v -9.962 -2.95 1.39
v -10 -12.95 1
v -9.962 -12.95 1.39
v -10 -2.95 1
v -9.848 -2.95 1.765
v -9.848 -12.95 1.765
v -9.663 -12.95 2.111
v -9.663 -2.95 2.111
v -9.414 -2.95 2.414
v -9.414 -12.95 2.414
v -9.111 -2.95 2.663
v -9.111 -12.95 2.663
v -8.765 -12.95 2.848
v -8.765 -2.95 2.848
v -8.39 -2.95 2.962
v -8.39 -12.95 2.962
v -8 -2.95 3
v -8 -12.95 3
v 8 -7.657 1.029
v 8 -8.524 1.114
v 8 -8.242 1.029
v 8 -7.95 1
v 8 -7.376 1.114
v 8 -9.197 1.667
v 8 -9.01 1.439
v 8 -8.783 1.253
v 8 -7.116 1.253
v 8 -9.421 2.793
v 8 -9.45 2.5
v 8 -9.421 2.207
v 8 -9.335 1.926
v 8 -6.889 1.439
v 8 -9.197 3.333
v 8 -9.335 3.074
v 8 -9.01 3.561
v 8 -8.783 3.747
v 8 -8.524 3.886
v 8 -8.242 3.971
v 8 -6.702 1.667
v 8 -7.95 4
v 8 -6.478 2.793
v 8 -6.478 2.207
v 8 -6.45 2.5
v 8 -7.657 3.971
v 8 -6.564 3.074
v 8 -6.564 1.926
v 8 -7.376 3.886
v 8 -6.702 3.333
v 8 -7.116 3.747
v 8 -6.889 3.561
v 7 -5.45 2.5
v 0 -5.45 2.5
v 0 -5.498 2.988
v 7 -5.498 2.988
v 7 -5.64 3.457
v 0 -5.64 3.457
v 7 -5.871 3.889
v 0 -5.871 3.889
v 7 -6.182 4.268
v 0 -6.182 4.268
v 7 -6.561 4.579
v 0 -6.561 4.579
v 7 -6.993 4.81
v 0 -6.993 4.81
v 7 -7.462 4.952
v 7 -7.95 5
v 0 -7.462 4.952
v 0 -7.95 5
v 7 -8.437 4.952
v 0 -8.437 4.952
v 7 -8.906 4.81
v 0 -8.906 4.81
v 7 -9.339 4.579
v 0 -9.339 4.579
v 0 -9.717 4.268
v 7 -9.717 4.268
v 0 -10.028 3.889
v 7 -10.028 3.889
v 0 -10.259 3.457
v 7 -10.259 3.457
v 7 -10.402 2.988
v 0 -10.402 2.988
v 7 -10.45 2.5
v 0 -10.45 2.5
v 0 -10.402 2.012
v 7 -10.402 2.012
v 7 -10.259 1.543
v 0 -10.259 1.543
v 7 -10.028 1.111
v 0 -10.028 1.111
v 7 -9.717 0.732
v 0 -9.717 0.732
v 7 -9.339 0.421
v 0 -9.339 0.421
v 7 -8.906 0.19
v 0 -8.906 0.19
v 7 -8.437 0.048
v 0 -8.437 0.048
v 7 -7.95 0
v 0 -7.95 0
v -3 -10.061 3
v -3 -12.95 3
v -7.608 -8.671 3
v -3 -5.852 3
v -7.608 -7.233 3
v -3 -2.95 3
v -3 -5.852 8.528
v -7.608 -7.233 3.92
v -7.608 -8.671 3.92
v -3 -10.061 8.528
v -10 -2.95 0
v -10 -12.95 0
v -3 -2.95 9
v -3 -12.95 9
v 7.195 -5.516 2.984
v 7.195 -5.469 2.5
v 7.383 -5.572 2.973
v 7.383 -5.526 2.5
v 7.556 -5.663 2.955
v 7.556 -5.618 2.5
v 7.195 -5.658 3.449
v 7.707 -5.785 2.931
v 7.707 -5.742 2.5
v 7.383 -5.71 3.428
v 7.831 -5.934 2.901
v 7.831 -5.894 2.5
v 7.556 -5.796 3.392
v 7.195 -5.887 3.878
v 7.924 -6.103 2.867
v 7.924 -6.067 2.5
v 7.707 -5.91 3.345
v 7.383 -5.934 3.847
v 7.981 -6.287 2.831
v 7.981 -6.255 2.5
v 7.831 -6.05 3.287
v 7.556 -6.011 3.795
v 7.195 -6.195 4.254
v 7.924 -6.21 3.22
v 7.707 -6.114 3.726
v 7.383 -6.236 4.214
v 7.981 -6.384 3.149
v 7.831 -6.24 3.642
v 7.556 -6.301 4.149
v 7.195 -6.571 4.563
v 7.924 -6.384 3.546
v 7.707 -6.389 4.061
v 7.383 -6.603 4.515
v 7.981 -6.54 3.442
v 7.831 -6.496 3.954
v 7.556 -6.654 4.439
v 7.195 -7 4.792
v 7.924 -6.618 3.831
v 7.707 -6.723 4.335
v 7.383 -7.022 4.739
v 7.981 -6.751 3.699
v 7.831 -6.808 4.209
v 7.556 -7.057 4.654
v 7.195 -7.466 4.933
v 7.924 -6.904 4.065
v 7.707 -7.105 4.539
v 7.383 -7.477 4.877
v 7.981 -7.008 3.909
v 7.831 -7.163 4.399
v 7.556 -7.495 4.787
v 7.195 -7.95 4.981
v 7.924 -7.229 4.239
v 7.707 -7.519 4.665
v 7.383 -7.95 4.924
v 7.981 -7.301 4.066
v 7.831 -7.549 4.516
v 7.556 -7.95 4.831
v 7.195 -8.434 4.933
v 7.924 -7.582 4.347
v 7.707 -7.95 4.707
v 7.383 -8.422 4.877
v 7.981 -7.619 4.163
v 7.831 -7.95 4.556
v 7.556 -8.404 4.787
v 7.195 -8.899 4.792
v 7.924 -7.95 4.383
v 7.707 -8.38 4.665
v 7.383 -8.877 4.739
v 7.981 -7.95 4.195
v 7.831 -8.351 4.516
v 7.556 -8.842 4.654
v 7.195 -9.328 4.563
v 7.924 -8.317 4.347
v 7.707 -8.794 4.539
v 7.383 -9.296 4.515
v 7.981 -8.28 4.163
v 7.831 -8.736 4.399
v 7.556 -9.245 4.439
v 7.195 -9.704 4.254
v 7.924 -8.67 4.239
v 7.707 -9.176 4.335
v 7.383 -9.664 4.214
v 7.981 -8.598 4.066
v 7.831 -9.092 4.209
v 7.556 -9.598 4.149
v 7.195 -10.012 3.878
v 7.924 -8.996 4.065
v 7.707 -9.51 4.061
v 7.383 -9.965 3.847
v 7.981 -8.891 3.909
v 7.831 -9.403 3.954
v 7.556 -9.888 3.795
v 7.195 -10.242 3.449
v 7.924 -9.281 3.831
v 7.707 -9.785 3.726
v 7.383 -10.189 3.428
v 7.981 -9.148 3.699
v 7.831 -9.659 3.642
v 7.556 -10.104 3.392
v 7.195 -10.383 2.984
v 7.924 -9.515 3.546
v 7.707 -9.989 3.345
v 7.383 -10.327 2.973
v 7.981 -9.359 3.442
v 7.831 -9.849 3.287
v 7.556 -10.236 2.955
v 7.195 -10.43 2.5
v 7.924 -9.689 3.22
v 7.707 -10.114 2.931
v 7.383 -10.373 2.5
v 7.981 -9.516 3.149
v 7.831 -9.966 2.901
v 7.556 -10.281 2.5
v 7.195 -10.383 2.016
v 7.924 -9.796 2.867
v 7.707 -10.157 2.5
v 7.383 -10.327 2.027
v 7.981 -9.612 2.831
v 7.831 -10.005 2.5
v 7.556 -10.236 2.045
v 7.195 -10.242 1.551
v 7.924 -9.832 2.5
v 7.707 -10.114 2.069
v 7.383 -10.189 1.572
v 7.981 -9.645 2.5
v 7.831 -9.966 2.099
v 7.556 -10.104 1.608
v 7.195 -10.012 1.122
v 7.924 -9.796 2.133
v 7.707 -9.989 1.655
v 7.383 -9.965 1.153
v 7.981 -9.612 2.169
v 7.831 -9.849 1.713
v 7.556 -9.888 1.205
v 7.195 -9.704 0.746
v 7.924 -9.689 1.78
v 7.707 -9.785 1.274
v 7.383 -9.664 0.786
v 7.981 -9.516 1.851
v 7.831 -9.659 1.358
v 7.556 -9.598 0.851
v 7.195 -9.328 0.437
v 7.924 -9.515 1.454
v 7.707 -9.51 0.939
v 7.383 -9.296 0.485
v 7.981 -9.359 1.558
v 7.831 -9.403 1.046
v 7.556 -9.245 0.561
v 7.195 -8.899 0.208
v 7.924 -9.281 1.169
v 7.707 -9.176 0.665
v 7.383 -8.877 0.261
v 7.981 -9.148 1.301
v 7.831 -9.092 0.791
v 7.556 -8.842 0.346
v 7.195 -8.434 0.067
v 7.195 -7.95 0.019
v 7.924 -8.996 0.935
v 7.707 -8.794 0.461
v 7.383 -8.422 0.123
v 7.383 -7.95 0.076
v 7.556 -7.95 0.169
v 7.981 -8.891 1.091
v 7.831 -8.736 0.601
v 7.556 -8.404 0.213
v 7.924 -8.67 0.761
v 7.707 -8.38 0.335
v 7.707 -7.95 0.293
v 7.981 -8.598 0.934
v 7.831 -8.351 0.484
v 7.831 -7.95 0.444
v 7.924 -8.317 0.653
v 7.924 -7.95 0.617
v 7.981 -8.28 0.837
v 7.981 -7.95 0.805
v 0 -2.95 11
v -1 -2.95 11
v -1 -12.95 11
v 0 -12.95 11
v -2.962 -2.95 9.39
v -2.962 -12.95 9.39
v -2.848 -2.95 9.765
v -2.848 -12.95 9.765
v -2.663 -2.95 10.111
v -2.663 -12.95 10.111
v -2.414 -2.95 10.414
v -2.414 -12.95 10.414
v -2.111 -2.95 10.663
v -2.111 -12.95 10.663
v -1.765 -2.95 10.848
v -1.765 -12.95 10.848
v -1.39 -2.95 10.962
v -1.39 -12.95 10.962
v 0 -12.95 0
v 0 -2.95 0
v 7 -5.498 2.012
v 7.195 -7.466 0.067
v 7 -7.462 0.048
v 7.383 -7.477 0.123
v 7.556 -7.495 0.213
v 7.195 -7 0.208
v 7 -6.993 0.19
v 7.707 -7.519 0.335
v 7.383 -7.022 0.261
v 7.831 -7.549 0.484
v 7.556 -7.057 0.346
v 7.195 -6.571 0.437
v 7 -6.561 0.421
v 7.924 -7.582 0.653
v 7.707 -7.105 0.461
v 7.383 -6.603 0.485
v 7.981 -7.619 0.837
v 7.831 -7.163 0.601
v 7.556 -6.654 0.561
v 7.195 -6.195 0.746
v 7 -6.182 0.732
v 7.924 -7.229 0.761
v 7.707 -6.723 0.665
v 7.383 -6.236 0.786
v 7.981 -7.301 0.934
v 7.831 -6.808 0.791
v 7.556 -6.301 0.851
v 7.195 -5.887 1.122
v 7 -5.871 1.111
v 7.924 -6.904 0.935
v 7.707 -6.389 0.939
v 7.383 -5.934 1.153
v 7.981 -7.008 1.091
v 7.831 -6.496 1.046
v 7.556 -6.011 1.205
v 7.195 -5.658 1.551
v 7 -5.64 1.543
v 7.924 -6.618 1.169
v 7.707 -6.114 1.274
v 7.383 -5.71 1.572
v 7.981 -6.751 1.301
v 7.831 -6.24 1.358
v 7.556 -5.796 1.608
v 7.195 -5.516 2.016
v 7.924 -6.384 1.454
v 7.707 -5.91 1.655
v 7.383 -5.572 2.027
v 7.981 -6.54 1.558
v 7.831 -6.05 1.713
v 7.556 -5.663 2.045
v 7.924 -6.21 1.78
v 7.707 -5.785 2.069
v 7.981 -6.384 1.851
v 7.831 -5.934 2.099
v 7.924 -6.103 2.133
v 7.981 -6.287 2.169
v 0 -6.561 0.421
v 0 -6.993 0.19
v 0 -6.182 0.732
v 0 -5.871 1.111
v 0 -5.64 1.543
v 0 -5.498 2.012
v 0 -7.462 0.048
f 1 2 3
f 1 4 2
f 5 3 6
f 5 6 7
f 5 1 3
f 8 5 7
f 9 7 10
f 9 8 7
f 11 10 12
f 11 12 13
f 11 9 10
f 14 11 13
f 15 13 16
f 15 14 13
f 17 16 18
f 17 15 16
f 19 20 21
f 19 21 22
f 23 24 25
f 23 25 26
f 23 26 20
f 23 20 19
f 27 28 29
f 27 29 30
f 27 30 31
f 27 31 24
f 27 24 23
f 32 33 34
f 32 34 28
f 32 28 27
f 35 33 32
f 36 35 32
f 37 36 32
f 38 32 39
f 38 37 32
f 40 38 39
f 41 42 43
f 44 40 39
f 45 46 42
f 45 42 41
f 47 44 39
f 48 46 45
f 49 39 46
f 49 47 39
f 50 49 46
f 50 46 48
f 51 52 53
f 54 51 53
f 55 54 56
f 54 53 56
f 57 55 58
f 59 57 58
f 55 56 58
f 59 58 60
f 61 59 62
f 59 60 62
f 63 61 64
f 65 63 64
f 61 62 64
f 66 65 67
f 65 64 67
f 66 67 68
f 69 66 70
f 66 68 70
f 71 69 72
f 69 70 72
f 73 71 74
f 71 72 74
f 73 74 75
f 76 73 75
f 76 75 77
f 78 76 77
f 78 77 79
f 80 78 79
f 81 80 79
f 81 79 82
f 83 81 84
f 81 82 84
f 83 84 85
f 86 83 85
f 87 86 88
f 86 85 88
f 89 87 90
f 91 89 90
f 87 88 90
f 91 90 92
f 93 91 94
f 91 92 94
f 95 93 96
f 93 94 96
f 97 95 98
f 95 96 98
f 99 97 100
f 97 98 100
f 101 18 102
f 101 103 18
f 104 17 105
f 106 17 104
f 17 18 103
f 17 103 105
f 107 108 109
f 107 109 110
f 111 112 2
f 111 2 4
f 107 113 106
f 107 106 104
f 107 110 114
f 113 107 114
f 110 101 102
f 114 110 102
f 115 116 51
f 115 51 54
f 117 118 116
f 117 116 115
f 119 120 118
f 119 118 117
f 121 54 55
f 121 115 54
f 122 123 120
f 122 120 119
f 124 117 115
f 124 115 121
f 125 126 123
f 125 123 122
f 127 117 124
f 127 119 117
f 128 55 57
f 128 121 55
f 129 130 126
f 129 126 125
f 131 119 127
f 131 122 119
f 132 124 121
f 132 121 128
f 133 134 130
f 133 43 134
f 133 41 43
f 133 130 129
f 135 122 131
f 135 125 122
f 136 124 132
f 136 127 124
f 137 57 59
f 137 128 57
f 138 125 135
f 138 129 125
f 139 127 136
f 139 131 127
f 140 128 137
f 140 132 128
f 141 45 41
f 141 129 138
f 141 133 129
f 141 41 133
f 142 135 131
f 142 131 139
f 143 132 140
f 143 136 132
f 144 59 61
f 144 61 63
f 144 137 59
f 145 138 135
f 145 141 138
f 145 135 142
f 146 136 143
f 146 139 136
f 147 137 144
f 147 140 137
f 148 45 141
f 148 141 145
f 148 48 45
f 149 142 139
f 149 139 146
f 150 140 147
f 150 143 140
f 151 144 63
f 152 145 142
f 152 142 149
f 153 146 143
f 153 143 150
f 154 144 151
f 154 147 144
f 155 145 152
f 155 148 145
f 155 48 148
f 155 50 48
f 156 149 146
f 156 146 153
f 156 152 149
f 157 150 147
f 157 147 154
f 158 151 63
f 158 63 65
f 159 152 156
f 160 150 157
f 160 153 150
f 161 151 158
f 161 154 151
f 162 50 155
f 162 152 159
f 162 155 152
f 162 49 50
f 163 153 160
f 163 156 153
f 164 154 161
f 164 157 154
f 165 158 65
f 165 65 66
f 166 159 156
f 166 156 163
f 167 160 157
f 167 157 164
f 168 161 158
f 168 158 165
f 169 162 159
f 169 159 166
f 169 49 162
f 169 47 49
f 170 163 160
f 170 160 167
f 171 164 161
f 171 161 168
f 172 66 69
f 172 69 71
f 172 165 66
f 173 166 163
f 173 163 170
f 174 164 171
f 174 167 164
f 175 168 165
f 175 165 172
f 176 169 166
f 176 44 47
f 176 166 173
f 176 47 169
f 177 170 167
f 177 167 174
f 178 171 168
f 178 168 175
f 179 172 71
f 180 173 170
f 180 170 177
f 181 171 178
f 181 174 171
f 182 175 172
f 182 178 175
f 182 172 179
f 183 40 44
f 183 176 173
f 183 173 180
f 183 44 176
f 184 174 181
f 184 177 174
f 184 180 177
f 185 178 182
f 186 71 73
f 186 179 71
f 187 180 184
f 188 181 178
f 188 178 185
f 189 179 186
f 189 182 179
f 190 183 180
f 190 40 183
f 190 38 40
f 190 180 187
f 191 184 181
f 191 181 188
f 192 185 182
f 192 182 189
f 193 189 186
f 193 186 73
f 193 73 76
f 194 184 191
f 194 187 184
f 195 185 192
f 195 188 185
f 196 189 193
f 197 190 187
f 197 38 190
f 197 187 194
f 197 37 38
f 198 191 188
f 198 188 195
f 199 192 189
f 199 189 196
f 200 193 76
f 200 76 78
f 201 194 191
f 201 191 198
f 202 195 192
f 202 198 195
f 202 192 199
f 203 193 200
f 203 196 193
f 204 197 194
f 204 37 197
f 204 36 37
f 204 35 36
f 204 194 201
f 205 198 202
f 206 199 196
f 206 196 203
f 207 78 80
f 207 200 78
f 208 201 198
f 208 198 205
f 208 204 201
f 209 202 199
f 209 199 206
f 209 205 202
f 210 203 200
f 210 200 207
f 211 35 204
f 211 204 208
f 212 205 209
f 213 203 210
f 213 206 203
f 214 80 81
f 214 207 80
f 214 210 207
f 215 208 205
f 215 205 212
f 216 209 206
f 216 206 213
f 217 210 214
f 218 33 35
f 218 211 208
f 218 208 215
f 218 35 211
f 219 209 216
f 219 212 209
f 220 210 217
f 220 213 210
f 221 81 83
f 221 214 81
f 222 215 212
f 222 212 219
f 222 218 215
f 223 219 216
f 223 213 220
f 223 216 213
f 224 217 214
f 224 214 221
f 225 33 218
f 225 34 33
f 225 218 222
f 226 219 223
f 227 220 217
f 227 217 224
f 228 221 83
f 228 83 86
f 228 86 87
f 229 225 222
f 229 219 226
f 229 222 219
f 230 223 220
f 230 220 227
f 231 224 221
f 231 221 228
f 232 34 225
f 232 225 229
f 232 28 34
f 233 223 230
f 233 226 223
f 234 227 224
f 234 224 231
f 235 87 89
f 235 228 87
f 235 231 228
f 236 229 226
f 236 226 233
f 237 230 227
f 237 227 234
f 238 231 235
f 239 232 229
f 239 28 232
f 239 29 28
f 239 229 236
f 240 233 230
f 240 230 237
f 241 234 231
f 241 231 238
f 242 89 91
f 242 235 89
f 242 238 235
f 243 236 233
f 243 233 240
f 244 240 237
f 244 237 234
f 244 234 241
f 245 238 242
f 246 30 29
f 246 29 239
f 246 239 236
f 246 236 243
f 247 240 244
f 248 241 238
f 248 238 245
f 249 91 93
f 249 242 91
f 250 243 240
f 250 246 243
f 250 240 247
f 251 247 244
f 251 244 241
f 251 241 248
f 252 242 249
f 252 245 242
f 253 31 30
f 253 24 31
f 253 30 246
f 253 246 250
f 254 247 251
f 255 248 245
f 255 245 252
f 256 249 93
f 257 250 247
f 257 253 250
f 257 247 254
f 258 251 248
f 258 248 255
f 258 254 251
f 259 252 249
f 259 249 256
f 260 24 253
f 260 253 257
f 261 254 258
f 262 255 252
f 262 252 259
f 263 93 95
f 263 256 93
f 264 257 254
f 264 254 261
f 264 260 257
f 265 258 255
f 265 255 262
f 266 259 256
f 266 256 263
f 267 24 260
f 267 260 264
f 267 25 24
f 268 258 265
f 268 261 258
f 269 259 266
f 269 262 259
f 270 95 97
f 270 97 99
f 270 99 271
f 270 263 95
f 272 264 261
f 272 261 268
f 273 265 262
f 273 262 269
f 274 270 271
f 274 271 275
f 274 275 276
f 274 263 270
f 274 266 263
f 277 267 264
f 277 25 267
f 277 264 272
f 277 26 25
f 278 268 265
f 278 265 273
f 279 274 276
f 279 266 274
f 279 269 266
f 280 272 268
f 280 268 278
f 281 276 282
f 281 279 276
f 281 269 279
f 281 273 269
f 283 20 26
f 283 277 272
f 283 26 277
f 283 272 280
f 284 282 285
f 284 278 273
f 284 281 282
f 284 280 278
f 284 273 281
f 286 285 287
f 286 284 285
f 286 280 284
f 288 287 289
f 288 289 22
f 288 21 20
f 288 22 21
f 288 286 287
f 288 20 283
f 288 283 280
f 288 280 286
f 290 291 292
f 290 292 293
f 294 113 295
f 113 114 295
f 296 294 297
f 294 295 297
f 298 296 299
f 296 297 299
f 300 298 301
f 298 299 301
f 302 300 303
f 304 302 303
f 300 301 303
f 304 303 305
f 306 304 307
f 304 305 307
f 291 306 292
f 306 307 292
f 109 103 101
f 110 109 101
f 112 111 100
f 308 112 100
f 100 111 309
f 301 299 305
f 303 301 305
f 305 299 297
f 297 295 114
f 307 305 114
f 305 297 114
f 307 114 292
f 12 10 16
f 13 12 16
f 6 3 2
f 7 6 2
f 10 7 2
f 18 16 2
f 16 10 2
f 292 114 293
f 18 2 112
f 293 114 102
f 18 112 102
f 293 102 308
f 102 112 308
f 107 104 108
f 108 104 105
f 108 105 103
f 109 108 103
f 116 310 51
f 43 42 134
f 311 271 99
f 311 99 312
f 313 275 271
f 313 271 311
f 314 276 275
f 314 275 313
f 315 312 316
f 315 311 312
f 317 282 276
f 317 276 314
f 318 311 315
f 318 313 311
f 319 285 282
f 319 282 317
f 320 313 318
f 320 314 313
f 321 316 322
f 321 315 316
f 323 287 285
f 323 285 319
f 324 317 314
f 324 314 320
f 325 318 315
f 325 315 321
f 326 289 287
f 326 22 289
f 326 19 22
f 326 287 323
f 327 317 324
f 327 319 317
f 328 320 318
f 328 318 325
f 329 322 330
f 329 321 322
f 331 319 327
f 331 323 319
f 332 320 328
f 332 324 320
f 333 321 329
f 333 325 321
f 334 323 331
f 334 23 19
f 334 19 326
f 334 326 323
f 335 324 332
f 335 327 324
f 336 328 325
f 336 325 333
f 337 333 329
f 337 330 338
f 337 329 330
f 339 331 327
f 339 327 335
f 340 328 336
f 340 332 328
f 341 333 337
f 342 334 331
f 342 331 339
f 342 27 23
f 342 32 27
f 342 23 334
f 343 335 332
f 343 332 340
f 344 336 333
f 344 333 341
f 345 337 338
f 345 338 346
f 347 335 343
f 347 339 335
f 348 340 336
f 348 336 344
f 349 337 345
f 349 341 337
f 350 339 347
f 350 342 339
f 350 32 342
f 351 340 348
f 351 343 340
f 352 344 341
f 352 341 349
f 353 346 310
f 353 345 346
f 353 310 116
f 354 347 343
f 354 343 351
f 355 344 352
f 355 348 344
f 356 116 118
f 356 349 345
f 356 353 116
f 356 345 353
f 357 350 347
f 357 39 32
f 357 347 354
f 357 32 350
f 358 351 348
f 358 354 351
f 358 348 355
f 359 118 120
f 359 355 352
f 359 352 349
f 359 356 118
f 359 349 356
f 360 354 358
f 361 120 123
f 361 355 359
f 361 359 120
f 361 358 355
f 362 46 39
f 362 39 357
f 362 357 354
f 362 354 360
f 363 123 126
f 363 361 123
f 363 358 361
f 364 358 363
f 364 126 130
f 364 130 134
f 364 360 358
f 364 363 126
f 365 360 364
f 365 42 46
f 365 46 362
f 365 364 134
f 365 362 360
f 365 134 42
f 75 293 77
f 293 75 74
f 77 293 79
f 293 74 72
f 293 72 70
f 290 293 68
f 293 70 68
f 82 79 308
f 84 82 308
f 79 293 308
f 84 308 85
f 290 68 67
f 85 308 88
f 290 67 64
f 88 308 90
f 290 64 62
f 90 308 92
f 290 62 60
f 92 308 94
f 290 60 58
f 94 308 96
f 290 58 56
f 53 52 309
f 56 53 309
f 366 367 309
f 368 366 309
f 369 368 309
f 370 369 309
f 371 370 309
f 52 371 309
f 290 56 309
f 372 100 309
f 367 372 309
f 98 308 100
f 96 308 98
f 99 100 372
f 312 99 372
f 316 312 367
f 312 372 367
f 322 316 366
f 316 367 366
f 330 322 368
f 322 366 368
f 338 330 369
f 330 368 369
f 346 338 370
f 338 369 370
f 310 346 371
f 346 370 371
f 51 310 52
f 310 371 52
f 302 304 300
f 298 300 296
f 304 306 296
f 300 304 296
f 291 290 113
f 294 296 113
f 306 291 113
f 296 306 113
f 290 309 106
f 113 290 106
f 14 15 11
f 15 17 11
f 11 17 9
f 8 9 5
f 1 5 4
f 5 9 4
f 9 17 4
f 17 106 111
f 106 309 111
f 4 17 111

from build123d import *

# Parameters (mm, degrees)
F0_W        = 10
F0_H        = 10
F1_DEPTH    = 3
F3_DEPTH    = 8
F4_DEPTH    = 6
F5_T4_DEPTH = 27.5665061863
F6_R        = 2
F8_DEPTH    = 8
F9_R        = 1


# Not quite as in the source:
# - a fillet or chamfer that OpenCascade refuses, or shapes differently, is made with other operations: its cross-section is extruded or revolved along the edge and cut away or added


with BuildPart() as f1:
    # F0 (on Top) → F1 (new body)
    with BuildSketch(Plane.XY):
        with Locations((-5, -7.9495952278)):
            Rectangle(F0_W, F0_H)
    extrude(amount=F1_DEPTH)

    # F2 (on face) → F3 (join)
    with BuildSketch(Plane.XY.offset(3)):
        Polygon((0, -12.9495952278), (0, -2.9495952278), (-3, -2.9495952278), (-3, -5.8524622582), (-3, -7.9495952278), (-3, -10.0610805675), (-3, -12.9495952278), align=None)
    extrude(amount=F3_DEPTH)

    # F2 (on face) → F4 (join)
    with BuildSketch(Plane.XY.offset(3)):
        Polygon((-3, -7.9495952278), (-3, -5.8524622582), (-7.6078968298, -7.2329440242), (-7.6078968298, -8.6711510528), (-3, -10.0610805675), align=None)
    extrude(amount=F4_DEPTH)

    # F5: chamfer of 5.08 on 1 edges, made by hand


with BuildPart() as f5_tool2:
    # F5_s3 → F5_t4 (new body)
    with BuildSketch(Plane.XZ.offset(-5.8312055546)):
        Polygon((-7.6078968298, 3.92), (-2.5278968298, 9), (-7.6078968298, 9), align=None)
    extrude(amount=F5_T4_DEPTH)

    split(bisect_by=Plane.YZ.offset(-3), keep=Keep.BOTTOM)


with BuildPart() as f1_1:
    add(f1.part)

    # F5_t1: cut F5_tool2
    add(f5_tool2.part, mode=Mode.SUBTRACT)

    # F6
    f6_edges = [f1_1.edges().sort_by_distance(p)[0] for p in [
        (-10, -7.949595, 3),
        (-3, -7.949595, 11),
    ]]
    fillet(f6_edges, radius=F6_R)

    # F7 (on face) → F8 (join)
    with BuildSketch(Plane.YZ):
        with BuildLine():
            ThreePointArc((-7.9495952278, 0), (-6.1818282749, 0.732233047), (-5.4495952278, 2.5))
            ThreePointArc((-5.4495952278, 2.5), (-9.7173621808, 4.267766953), (-7.9495952278, 0))
        make_face()
    extrude(amount=F8_DEPTH)

    # F9
    f9_edges = [f1_1.edges().sort_by_distance(p)[0] for p in [
        (8, -7.949595, 5),
    ]]
    fillet(f9_edges, radius=F9_R)


solid = f1_1.part
